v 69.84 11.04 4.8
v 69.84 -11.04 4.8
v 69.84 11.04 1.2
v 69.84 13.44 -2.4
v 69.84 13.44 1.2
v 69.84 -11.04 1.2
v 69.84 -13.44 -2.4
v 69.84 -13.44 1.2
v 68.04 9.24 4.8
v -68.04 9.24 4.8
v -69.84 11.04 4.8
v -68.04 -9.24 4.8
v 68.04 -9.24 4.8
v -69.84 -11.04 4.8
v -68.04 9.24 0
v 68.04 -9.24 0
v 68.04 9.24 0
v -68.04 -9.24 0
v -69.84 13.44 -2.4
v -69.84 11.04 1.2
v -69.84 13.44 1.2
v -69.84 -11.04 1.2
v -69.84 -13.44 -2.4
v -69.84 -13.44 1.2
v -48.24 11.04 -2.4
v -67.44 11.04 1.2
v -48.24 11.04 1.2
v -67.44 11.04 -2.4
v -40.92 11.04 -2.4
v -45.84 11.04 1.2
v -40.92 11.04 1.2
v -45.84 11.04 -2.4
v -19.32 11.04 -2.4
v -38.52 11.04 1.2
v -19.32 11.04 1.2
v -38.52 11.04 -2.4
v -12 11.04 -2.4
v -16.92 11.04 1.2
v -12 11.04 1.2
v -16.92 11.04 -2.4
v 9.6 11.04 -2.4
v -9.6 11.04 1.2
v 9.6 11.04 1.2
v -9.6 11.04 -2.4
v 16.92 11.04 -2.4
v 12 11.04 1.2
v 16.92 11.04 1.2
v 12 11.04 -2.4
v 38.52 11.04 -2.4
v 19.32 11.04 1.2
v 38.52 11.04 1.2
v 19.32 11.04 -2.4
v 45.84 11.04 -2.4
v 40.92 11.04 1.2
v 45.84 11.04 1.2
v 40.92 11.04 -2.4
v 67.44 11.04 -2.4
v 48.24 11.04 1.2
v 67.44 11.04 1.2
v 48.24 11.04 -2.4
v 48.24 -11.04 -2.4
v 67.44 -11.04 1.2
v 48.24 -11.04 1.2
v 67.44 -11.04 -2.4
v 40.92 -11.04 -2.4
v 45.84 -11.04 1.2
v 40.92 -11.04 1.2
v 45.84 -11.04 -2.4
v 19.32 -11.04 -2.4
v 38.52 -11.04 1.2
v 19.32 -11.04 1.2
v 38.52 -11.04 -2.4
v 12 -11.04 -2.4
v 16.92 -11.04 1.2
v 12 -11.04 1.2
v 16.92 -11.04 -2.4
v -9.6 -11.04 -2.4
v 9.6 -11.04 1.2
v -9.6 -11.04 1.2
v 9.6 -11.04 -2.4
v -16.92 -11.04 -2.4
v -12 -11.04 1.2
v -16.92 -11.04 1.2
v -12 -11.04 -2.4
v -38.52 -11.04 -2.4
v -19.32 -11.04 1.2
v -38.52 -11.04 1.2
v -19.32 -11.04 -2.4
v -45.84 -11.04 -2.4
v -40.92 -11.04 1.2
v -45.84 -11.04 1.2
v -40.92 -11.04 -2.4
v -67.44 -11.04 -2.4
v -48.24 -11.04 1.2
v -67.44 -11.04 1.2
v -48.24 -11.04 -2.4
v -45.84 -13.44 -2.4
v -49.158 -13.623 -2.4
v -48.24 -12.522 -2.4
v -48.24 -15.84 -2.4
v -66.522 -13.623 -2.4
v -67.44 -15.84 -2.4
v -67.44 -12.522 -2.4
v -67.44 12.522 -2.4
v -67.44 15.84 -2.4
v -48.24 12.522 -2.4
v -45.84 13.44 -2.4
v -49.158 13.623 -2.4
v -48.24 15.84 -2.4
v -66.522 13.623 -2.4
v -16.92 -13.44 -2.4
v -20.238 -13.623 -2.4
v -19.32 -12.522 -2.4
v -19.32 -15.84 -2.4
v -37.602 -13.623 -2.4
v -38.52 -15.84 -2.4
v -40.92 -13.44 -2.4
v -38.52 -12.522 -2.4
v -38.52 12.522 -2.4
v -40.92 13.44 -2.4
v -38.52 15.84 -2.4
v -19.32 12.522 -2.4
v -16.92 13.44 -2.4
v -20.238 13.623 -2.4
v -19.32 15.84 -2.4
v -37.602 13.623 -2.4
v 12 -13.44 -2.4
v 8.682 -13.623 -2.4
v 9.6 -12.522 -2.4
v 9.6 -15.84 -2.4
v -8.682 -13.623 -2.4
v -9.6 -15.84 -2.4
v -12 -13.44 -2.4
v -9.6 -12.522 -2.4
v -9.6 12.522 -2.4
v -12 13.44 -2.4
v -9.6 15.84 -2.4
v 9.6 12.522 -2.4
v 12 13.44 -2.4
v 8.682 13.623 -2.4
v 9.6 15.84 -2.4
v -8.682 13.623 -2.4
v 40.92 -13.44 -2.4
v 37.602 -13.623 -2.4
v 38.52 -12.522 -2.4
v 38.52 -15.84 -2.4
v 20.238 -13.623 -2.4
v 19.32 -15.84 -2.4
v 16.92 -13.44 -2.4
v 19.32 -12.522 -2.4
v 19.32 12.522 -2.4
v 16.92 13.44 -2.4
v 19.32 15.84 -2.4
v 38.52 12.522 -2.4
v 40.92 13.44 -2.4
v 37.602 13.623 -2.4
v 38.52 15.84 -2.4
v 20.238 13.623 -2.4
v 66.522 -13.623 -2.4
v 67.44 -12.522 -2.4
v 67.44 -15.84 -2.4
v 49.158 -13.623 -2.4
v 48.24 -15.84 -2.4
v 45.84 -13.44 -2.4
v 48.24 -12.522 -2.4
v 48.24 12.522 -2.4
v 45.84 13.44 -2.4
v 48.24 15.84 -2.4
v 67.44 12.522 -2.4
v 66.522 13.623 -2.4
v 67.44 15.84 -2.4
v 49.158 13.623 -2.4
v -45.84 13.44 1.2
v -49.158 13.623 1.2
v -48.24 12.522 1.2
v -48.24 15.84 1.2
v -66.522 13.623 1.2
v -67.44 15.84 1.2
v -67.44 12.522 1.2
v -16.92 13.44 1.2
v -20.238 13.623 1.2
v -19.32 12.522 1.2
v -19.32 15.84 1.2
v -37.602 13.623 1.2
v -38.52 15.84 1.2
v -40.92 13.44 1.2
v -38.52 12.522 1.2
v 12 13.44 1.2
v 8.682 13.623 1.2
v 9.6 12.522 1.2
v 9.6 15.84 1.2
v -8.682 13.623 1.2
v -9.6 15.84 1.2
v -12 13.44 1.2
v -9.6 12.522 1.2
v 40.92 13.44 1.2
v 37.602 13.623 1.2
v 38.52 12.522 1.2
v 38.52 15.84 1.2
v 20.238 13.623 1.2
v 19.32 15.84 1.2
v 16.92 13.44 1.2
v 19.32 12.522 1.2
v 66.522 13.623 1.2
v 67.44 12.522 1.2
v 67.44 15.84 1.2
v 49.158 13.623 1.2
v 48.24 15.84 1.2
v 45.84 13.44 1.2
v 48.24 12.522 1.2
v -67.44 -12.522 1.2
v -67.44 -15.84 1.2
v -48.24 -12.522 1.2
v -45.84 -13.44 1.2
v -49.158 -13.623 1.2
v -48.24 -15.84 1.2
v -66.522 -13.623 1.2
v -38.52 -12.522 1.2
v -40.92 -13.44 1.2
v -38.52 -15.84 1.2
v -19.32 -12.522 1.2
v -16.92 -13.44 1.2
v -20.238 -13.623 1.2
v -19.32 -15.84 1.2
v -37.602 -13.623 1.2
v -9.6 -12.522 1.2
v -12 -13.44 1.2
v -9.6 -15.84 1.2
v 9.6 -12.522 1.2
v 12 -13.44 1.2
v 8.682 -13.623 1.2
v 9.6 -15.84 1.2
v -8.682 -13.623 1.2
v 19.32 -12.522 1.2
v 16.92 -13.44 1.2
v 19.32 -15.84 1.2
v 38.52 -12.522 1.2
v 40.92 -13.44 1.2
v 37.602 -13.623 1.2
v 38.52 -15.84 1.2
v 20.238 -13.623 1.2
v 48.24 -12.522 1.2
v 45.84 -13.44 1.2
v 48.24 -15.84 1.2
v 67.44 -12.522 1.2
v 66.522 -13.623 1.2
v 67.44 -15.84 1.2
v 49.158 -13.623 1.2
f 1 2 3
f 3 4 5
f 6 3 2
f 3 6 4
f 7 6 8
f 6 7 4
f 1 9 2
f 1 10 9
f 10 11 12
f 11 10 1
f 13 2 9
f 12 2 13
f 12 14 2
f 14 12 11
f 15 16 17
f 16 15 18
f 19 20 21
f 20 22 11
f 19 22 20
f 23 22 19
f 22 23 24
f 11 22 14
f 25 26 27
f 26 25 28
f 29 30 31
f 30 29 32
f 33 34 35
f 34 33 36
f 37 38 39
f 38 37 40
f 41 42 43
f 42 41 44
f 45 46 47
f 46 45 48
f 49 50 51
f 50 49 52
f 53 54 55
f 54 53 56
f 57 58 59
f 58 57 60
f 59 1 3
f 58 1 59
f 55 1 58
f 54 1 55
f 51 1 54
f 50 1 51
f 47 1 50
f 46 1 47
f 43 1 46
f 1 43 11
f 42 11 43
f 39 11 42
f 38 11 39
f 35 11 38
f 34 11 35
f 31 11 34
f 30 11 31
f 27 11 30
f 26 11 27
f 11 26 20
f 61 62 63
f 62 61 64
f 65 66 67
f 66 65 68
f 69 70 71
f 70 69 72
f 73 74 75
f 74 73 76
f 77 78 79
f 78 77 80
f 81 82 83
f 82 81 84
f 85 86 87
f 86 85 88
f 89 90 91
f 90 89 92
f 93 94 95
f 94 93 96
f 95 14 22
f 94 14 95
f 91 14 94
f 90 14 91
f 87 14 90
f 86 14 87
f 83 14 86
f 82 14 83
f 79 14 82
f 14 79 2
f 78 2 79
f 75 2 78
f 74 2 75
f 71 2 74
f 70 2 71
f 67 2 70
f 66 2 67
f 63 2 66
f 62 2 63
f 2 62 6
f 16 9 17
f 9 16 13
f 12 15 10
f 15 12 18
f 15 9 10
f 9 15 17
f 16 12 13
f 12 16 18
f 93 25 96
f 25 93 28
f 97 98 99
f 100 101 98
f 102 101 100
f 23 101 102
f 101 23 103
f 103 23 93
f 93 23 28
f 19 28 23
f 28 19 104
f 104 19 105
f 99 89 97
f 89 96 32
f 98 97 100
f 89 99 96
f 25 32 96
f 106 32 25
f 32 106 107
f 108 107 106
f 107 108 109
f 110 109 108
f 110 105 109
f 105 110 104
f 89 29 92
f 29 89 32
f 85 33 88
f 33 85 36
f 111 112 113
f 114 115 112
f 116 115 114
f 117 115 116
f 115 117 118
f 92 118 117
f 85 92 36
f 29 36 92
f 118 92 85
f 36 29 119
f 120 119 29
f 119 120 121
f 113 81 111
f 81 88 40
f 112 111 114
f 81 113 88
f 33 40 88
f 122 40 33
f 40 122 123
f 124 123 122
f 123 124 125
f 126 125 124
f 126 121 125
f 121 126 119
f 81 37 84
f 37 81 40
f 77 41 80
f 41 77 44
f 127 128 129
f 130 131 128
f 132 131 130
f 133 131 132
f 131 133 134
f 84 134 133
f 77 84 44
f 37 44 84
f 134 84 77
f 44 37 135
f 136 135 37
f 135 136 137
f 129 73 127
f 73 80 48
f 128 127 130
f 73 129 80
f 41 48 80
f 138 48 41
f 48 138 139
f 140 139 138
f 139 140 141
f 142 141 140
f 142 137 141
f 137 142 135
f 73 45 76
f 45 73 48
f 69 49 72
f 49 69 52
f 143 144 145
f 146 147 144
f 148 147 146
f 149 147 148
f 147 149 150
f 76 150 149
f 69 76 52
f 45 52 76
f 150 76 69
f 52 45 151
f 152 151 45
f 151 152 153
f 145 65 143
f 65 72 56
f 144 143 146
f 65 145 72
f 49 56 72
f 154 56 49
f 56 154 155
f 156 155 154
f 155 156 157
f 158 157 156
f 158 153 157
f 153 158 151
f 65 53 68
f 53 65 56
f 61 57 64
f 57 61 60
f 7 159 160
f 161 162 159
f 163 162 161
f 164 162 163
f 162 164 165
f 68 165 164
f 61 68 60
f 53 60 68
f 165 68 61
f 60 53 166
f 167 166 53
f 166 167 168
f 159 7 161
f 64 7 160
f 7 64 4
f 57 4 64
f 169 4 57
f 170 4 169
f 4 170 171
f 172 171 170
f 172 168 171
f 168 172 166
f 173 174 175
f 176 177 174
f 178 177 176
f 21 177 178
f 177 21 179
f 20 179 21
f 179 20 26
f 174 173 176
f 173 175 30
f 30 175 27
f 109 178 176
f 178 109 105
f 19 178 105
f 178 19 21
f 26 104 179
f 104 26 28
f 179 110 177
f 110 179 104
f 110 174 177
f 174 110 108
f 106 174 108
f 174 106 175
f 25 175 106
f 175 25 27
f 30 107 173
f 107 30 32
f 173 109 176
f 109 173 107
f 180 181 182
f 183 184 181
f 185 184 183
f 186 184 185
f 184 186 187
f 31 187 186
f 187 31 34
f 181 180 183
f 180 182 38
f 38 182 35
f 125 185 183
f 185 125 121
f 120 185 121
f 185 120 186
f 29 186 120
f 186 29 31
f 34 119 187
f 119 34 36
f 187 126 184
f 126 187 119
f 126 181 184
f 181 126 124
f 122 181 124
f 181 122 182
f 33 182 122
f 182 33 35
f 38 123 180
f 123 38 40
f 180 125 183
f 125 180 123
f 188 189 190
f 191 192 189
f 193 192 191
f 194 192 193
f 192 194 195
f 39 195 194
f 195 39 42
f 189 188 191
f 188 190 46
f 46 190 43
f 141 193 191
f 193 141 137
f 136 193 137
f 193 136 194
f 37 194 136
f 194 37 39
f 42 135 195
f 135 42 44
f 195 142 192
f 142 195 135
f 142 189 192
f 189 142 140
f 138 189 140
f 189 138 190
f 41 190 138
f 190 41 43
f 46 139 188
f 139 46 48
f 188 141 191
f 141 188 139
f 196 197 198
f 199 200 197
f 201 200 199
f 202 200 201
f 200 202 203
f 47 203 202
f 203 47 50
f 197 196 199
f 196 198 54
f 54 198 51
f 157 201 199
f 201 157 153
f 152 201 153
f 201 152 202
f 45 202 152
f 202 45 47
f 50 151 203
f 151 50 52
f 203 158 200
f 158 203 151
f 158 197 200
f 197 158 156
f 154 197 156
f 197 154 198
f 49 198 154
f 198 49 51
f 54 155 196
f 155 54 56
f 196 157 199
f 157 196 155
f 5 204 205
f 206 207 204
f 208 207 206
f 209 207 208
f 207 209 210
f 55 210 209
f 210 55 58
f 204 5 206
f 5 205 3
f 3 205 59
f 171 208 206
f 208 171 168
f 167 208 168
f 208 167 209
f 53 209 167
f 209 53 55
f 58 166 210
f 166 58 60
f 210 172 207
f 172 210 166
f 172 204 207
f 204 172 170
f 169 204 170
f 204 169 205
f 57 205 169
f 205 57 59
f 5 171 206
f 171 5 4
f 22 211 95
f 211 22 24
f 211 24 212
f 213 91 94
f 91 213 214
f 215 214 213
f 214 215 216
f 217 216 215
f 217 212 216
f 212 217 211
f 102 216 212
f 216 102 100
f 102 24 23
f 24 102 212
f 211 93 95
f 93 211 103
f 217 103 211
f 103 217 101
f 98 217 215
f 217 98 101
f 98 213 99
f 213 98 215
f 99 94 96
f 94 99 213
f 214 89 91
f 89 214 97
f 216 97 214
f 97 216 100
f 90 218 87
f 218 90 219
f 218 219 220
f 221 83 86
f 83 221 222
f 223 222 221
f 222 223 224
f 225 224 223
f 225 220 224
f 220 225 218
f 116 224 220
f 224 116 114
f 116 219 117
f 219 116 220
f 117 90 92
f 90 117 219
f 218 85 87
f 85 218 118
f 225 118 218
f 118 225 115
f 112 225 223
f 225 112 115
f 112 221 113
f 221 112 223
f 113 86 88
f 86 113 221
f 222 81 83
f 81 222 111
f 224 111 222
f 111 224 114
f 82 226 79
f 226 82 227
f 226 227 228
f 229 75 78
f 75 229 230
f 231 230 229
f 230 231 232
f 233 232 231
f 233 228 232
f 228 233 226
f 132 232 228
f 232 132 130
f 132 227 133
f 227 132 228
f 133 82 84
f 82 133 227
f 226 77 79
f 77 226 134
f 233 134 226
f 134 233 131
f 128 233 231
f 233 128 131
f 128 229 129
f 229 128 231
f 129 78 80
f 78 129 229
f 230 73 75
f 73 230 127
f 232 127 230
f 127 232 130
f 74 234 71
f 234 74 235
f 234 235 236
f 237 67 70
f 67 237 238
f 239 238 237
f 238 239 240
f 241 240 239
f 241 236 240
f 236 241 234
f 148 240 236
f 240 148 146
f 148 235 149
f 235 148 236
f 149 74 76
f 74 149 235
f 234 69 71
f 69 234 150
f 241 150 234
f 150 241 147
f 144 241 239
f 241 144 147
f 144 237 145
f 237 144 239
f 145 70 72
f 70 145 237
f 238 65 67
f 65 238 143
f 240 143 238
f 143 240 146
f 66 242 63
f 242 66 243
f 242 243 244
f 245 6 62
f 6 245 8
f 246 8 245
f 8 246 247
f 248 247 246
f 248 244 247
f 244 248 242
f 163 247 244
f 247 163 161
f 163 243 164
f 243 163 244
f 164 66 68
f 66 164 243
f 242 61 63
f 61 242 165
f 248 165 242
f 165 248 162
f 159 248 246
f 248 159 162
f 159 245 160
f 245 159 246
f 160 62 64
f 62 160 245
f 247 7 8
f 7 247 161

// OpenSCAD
// file: ../src/ear.scad
//Угловатое квадратное ухо.
//"w" - толщина уха
module sqr_ear(y,x,w,h) {
    translate([-y/2,0,0])
    difference() {
        cube([y,x,h]);
        translate([w,0,0]) cube([y-w*2,x-w,h]);
    }
}

//Ухо со сглаженными углами.
//"y" - должен быть больше чем "x".
//"w" - толщина уха
module slc_ear(y,x,w,h){
    rotate([0,0,90])
    translate([0,-y/2,0])
    linear_extrude(height=h)
    polygon([
    [0,0],
    [x/2,0],
    [x,x/2],
    [x,y-x/2],
    [x/2,y],
    [0,y],
    [0,y - w],
    [x/2 - w * sin(45/2),y - w],
    [x - w * sin(45/2*3),y -x/2 - w * cos(45/2*3)],
    [x - w * sin(45/2*3),x/2 + w * cos(45/2*3)],
    [x/2 - w * sin(45/2),w],
    [0,w],
    ]);       
}

//Ухо в виде ободка.
module rim_ears(er,ir,iir,w,h,n) {
    union() {
        difference() {
            cylinder(r=er, h=h);
            cylinder(r=ir, h=h);
        }
        difference() {
            for(fi = [0 : 360/n : 359]) 
            rotate([0,0,fi])
            translate([0,-w/2,0])cube([ir,w,h]);
            cylinder(r=iir,h=h);
        }
    }
}

module radiused(offset,radius) {
    ystate = sqrt(radius*radius - offset*offset);
    translate([0,ystate,0]) children(0);
}

//Демонстрационный код:
//  Массив sqr_ear.
/*for(fi = [0 : 60 : 359]) 
    rotate([0,0,fi])
    radiused(10,30) sqr_ear(10,6,2,3);*/

//  Массив slc_ear.
/*for(fi = [0 : 60 : 359]) 
    rotate([0,0,fi])
    radiused(10,30) slc_ear(10,6,2,3);*/

//  Круговое ухо (rim_ears).
//rim_ears(40,35,30,4,3,3);
// file: ../src/navalniy2018.scad
//Данный модуль строит 3д символ компании (image/symbol.png) 
module navalniy2018(x,y,z,s,bh) {
    symbol_file = "../image/navalniy2.png";
    symbol_x = 552 + s;
    symbol_y = 62 + s;
    
    scale([1/symbol_x*x,1/symbol_y*y,1/100*z])
    union() {
    translate([0,0,100])
    surface(file=symbol_file, invert=true,center=true);
    
    translate([0,0,-bh])cube([symbol_x, symbol_y,bh], center=true);
        
    }
   // linear_extrude(height = z, center = true, convexity = 10)
   //import (file = symbol_file);
}
    
//Демонстрационный код.
//navalniy2018(552/2,62/2,10,20,1);
// main file
include<../src/navalniy2018.scad>
include<../src/ear.scad>

s=30;
xf = (552 + s)/5 ;
yf = (62 + s)/5;
zf = 6;
bh = 2;
h=6;
w = 3;

scale(1.2)
union() {
    translate([0,0,-(bh)/2])
        cube([xf,yf,bh],center=true);
    translate([0,0,(h-bh)/2])
        difference(){
            cube([xf,yf,h-bh], center=true);
            cube([xf-w,yf-w,h-bh], center=true);
        }
    navalniy2018(xf,yf,zf,s,3);
        
        for(k = [- xf / 2 + 10 : (xf - 20) / 4 : (xf - 10)/2])
        translate([k,yf/2,-(bh)])    
        slc_ear(20,4,2,3);
        
        mirror([0,1,0])
        for(k = [- xf / 2 + 10 : (xf - 20) / 4 : (xf - 10)/2])
        translate([k,yf/2,-(bh)])    
        slc_ear(20,4,2,3);
}
